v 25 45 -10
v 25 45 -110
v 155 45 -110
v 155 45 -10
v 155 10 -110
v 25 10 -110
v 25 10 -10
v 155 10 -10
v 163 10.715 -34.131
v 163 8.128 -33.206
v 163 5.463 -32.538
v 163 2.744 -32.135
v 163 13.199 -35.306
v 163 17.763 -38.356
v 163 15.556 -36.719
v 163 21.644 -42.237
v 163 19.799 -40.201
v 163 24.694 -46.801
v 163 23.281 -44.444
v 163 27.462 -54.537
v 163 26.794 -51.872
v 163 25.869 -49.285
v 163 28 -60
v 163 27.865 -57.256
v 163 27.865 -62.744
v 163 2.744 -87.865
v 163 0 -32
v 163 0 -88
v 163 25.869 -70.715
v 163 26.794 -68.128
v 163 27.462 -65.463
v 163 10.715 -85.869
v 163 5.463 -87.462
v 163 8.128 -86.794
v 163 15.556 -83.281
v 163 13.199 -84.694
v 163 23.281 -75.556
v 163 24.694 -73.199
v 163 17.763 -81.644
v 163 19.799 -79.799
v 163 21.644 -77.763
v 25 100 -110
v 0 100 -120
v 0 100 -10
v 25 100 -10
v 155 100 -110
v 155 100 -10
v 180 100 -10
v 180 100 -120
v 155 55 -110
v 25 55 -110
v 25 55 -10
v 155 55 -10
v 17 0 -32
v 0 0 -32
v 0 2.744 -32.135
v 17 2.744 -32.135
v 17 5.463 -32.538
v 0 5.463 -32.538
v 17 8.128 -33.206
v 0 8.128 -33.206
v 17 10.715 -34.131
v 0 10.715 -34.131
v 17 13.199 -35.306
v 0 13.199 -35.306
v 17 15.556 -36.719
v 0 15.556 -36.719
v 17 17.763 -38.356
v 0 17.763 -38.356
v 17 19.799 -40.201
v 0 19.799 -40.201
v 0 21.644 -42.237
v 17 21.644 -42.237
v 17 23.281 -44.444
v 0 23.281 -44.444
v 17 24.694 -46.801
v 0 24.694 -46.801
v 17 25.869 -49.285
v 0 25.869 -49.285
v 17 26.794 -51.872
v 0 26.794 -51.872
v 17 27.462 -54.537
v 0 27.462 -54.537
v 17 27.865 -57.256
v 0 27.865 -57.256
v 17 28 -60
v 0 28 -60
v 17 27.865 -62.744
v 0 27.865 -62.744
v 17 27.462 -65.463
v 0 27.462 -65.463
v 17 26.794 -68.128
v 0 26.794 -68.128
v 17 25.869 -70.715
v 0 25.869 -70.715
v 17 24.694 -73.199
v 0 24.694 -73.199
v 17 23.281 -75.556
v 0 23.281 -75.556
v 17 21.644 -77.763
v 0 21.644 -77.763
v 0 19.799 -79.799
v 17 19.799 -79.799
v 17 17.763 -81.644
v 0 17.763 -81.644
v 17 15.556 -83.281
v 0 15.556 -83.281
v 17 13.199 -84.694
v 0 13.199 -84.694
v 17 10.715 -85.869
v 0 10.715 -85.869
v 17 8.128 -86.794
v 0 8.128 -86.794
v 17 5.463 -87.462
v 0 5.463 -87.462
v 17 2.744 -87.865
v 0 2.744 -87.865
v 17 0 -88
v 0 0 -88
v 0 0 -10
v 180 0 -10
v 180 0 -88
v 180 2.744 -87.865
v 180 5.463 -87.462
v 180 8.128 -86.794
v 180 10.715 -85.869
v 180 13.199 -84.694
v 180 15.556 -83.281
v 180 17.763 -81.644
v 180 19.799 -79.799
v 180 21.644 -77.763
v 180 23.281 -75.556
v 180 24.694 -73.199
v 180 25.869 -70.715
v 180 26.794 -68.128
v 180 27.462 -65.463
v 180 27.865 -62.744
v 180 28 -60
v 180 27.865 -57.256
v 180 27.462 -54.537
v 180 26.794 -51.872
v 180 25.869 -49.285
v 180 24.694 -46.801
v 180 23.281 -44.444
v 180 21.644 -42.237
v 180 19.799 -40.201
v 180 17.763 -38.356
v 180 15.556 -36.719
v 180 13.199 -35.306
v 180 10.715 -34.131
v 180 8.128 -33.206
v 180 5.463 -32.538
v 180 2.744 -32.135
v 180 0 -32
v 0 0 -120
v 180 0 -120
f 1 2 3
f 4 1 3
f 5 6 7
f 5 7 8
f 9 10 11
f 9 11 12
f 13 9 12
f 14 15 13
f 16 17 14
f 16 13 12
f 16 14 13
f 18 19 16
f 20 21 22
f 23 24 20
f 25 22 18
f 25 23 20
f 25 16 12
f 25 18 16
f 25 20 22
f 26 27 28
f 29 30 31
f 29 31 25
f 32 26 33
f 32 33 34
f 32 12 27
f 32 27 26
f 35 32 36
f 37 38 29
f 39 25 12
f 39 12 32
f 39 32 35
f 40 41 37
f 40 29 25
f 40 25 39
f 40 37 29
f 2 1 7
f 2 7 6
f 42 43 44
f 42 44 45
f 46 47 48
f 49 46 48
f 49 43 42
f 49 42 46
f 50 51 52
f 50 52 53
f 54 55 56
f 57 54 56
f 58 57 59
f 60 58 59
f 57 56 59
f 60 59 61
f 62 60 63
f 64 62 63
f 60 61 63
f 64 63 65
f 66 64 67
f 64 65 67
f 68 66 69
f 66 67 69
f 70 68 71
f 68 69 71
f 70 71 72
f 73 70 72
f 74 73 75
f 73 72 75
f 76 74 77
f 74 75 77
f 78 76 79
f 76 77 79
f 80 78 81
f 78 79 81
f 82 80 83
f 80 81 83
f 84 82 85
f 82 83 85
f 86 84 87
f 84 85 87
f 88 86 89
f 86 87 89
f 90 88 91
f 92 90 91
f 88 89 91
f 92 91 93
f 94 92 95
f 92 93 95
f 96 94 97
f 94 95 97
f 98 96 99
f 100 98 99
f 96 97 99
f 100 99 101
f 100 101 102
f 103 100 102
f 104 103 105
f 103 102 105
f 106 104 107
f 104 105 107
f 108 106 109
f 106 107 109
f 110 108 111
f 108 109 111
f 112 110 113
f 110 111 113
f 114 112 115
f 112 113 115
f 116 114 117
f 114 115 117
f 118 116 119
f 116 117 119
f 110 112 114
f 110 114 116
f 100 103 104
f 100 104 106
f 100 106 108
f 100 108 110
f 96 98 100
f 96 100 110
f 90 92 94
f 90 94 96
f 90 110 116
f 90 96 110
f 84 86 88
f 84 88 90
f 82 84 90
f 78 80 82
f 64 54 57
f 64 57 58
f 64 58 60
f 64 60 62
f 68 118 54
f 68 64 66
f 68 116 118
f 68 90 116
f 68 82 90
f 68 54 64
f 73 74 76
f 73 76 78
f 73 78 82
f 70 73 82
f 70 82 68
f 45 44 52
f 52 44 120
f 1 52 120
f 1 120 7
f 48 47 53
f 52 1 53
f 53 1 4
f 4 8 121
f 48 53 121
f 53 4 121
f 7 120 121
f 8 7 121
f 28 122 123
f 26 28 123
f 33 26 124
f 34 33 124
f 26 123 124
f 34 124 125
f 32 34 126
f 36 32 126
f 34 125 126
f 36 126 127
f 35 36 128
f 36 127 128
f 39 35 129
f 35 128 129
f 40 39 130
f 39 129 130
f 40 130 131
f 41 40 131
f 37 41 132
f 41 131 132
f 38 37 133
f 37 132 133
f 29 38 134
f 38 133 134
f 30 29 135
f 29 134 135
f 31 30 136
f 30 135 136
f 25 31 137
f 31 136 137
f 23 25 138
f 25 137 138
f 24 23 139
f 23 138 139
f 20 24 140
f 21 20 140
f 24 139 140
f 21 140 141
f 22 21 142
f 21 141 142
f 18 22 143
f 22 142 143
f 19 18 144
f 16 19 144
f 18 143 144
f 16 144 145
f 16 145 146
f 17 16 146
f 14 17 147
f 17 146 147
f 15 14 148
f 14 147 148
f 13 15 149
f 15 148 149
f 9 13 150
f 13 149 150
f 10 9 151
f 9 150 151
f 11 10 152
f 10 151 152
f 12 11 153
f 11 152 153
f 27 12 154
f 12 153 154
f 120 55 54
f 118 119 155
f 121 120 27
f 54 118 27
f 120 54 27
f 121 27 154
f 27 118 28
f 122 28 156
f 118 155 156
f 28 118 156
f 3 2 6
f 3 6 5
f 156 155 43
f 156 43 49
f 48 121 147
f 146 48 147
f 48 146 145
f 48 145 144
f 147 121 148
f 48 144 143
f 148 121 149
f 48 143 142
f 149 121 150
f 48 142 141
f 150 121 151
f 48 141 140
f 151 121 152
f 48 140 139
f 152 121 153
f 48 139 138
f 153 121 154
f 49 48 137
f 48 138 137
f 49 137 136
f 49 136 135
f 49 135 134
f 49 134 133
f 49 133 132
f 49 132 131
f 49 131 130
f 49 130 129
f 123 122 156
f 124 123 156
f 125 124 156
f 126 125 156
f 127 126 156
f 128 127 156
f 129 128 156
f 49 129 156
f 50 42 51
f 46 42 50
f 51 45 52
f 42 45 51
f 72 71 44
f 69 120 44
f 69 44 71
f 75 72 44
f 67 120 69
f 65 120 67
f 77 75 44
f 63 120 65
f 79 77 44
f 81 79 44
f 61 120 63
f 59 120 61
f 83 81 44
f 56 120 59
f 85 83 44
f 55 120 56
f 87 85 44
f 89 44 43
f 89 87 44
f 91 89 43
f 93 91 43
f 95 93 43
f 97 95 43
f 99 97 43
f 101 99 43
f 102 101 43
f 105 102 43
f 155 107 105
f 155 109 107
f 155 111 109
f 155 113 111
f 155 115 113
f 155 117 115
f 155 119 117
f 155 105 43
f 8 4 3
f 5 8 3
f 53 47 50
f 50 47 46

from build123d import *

# Parameters (mm, degrees)
SKETCH1_W           = 180
SKETCH1_H           = 120
BOSS_EXTRUDE1_DEPTH = 100
SKETCH2_W           = 130
SKETCH2_H           = 100
CUT_EXTRUDE1_DEPTH  = 90
CUT_EXTRUDE2_DEPTH  = 17
CUT_EXTRUDE3_DEPTH  = 17
CUT_EXTRUDE4_START  = -100
SKETCH6_W           = 180
SKETCH6_H           = 10
CUT_EXTRUDE4_DEPTH  = 100
SKETCH7_W           = 130
SKETCH7_H           = 10
BOSS_EXTRUDE2_DEPTH = 100


with BuildPart() as part:
    # Sketch1 → Boss-Extrude1 (new body)
    with BuildSketch(Plane(origin=(0, 0, 0), x_dir=(1, 0, 0), z_dir=(0, 1, 0))):
        with Locations((90, 60)):
            Rectangle(SKETCH1_W, SKETCH1_H)
    extrude(amount=BOSS_EXTRUDE1_DEPTH)

    # Sketch2 → Cut-Extrude1 (cut)
    with BuildSketch(Plane(origin=(0, 100, 0), x_dir=(1, 0, 0), z_dir=(0, 1, 0))):
        with Locations((90, 60)):
            Rectangle(SKETCH2_W, SKETCH2_H)
    extrude(amount=-CUT_EXTRUDE1_DEPTH, mode=Mode.SUBTRACT)

    # Sketch3 → Cut-Extrude2 (cut)
    with BuildSketch(Plane(origin=(180, 0, 0), x_dir=(0, 0, -1), z_dir=(1, 0, 0))):
        with BuildLine():
            Line((32, 0), (88, 0))
            ThreePointArc((88, 0), (60, 28), (32, 0))
        make_face()
    extrude(amount=-CUT_EXTRUDE2_DEPTH, mode=Mode.SUBTRACT)

    # Sketch5 → Cut-Extrude3 (cut)
    with BuildSketch(Plane.ZY):
        with BuildLine():
            Line((-88, 0), (-32, 0))
            ThreePointArc((-32, 0), (-60, 28), (-88, 0))
        make_face()
    extrude(amount=-CUT_EXTRUDE3_DEPTH, mode=Mode.SUBTRACT)

    # Sketch6 → Cut-Extrude4 (cut)
    with BuildSketch(Plane(origin=(0, 100, 0), x_dir=(1, 0, 0), z_dir=(0, 1, 0)).offset(CUT_EXTRUDE4_START)):
        with Locations((90, 5)):
            Rectangle(SKETCH6_W, SKETCH6_H)
    extrude(amount=CUT_EXTRUDE4_DEPTH, mode=Mode.SUBTRACT)

    # Sketch7 → Boss-Extrude2 (add)
    with BuildSketch(Plane.XY.offset(-110)):
        with Locations((90, 50)):
            Rectangle(SKETCH7_W, SKETCH7_H)
    extrude(amount=BOSS_EXTRUDE2_DEPTH)


solid = part.part
